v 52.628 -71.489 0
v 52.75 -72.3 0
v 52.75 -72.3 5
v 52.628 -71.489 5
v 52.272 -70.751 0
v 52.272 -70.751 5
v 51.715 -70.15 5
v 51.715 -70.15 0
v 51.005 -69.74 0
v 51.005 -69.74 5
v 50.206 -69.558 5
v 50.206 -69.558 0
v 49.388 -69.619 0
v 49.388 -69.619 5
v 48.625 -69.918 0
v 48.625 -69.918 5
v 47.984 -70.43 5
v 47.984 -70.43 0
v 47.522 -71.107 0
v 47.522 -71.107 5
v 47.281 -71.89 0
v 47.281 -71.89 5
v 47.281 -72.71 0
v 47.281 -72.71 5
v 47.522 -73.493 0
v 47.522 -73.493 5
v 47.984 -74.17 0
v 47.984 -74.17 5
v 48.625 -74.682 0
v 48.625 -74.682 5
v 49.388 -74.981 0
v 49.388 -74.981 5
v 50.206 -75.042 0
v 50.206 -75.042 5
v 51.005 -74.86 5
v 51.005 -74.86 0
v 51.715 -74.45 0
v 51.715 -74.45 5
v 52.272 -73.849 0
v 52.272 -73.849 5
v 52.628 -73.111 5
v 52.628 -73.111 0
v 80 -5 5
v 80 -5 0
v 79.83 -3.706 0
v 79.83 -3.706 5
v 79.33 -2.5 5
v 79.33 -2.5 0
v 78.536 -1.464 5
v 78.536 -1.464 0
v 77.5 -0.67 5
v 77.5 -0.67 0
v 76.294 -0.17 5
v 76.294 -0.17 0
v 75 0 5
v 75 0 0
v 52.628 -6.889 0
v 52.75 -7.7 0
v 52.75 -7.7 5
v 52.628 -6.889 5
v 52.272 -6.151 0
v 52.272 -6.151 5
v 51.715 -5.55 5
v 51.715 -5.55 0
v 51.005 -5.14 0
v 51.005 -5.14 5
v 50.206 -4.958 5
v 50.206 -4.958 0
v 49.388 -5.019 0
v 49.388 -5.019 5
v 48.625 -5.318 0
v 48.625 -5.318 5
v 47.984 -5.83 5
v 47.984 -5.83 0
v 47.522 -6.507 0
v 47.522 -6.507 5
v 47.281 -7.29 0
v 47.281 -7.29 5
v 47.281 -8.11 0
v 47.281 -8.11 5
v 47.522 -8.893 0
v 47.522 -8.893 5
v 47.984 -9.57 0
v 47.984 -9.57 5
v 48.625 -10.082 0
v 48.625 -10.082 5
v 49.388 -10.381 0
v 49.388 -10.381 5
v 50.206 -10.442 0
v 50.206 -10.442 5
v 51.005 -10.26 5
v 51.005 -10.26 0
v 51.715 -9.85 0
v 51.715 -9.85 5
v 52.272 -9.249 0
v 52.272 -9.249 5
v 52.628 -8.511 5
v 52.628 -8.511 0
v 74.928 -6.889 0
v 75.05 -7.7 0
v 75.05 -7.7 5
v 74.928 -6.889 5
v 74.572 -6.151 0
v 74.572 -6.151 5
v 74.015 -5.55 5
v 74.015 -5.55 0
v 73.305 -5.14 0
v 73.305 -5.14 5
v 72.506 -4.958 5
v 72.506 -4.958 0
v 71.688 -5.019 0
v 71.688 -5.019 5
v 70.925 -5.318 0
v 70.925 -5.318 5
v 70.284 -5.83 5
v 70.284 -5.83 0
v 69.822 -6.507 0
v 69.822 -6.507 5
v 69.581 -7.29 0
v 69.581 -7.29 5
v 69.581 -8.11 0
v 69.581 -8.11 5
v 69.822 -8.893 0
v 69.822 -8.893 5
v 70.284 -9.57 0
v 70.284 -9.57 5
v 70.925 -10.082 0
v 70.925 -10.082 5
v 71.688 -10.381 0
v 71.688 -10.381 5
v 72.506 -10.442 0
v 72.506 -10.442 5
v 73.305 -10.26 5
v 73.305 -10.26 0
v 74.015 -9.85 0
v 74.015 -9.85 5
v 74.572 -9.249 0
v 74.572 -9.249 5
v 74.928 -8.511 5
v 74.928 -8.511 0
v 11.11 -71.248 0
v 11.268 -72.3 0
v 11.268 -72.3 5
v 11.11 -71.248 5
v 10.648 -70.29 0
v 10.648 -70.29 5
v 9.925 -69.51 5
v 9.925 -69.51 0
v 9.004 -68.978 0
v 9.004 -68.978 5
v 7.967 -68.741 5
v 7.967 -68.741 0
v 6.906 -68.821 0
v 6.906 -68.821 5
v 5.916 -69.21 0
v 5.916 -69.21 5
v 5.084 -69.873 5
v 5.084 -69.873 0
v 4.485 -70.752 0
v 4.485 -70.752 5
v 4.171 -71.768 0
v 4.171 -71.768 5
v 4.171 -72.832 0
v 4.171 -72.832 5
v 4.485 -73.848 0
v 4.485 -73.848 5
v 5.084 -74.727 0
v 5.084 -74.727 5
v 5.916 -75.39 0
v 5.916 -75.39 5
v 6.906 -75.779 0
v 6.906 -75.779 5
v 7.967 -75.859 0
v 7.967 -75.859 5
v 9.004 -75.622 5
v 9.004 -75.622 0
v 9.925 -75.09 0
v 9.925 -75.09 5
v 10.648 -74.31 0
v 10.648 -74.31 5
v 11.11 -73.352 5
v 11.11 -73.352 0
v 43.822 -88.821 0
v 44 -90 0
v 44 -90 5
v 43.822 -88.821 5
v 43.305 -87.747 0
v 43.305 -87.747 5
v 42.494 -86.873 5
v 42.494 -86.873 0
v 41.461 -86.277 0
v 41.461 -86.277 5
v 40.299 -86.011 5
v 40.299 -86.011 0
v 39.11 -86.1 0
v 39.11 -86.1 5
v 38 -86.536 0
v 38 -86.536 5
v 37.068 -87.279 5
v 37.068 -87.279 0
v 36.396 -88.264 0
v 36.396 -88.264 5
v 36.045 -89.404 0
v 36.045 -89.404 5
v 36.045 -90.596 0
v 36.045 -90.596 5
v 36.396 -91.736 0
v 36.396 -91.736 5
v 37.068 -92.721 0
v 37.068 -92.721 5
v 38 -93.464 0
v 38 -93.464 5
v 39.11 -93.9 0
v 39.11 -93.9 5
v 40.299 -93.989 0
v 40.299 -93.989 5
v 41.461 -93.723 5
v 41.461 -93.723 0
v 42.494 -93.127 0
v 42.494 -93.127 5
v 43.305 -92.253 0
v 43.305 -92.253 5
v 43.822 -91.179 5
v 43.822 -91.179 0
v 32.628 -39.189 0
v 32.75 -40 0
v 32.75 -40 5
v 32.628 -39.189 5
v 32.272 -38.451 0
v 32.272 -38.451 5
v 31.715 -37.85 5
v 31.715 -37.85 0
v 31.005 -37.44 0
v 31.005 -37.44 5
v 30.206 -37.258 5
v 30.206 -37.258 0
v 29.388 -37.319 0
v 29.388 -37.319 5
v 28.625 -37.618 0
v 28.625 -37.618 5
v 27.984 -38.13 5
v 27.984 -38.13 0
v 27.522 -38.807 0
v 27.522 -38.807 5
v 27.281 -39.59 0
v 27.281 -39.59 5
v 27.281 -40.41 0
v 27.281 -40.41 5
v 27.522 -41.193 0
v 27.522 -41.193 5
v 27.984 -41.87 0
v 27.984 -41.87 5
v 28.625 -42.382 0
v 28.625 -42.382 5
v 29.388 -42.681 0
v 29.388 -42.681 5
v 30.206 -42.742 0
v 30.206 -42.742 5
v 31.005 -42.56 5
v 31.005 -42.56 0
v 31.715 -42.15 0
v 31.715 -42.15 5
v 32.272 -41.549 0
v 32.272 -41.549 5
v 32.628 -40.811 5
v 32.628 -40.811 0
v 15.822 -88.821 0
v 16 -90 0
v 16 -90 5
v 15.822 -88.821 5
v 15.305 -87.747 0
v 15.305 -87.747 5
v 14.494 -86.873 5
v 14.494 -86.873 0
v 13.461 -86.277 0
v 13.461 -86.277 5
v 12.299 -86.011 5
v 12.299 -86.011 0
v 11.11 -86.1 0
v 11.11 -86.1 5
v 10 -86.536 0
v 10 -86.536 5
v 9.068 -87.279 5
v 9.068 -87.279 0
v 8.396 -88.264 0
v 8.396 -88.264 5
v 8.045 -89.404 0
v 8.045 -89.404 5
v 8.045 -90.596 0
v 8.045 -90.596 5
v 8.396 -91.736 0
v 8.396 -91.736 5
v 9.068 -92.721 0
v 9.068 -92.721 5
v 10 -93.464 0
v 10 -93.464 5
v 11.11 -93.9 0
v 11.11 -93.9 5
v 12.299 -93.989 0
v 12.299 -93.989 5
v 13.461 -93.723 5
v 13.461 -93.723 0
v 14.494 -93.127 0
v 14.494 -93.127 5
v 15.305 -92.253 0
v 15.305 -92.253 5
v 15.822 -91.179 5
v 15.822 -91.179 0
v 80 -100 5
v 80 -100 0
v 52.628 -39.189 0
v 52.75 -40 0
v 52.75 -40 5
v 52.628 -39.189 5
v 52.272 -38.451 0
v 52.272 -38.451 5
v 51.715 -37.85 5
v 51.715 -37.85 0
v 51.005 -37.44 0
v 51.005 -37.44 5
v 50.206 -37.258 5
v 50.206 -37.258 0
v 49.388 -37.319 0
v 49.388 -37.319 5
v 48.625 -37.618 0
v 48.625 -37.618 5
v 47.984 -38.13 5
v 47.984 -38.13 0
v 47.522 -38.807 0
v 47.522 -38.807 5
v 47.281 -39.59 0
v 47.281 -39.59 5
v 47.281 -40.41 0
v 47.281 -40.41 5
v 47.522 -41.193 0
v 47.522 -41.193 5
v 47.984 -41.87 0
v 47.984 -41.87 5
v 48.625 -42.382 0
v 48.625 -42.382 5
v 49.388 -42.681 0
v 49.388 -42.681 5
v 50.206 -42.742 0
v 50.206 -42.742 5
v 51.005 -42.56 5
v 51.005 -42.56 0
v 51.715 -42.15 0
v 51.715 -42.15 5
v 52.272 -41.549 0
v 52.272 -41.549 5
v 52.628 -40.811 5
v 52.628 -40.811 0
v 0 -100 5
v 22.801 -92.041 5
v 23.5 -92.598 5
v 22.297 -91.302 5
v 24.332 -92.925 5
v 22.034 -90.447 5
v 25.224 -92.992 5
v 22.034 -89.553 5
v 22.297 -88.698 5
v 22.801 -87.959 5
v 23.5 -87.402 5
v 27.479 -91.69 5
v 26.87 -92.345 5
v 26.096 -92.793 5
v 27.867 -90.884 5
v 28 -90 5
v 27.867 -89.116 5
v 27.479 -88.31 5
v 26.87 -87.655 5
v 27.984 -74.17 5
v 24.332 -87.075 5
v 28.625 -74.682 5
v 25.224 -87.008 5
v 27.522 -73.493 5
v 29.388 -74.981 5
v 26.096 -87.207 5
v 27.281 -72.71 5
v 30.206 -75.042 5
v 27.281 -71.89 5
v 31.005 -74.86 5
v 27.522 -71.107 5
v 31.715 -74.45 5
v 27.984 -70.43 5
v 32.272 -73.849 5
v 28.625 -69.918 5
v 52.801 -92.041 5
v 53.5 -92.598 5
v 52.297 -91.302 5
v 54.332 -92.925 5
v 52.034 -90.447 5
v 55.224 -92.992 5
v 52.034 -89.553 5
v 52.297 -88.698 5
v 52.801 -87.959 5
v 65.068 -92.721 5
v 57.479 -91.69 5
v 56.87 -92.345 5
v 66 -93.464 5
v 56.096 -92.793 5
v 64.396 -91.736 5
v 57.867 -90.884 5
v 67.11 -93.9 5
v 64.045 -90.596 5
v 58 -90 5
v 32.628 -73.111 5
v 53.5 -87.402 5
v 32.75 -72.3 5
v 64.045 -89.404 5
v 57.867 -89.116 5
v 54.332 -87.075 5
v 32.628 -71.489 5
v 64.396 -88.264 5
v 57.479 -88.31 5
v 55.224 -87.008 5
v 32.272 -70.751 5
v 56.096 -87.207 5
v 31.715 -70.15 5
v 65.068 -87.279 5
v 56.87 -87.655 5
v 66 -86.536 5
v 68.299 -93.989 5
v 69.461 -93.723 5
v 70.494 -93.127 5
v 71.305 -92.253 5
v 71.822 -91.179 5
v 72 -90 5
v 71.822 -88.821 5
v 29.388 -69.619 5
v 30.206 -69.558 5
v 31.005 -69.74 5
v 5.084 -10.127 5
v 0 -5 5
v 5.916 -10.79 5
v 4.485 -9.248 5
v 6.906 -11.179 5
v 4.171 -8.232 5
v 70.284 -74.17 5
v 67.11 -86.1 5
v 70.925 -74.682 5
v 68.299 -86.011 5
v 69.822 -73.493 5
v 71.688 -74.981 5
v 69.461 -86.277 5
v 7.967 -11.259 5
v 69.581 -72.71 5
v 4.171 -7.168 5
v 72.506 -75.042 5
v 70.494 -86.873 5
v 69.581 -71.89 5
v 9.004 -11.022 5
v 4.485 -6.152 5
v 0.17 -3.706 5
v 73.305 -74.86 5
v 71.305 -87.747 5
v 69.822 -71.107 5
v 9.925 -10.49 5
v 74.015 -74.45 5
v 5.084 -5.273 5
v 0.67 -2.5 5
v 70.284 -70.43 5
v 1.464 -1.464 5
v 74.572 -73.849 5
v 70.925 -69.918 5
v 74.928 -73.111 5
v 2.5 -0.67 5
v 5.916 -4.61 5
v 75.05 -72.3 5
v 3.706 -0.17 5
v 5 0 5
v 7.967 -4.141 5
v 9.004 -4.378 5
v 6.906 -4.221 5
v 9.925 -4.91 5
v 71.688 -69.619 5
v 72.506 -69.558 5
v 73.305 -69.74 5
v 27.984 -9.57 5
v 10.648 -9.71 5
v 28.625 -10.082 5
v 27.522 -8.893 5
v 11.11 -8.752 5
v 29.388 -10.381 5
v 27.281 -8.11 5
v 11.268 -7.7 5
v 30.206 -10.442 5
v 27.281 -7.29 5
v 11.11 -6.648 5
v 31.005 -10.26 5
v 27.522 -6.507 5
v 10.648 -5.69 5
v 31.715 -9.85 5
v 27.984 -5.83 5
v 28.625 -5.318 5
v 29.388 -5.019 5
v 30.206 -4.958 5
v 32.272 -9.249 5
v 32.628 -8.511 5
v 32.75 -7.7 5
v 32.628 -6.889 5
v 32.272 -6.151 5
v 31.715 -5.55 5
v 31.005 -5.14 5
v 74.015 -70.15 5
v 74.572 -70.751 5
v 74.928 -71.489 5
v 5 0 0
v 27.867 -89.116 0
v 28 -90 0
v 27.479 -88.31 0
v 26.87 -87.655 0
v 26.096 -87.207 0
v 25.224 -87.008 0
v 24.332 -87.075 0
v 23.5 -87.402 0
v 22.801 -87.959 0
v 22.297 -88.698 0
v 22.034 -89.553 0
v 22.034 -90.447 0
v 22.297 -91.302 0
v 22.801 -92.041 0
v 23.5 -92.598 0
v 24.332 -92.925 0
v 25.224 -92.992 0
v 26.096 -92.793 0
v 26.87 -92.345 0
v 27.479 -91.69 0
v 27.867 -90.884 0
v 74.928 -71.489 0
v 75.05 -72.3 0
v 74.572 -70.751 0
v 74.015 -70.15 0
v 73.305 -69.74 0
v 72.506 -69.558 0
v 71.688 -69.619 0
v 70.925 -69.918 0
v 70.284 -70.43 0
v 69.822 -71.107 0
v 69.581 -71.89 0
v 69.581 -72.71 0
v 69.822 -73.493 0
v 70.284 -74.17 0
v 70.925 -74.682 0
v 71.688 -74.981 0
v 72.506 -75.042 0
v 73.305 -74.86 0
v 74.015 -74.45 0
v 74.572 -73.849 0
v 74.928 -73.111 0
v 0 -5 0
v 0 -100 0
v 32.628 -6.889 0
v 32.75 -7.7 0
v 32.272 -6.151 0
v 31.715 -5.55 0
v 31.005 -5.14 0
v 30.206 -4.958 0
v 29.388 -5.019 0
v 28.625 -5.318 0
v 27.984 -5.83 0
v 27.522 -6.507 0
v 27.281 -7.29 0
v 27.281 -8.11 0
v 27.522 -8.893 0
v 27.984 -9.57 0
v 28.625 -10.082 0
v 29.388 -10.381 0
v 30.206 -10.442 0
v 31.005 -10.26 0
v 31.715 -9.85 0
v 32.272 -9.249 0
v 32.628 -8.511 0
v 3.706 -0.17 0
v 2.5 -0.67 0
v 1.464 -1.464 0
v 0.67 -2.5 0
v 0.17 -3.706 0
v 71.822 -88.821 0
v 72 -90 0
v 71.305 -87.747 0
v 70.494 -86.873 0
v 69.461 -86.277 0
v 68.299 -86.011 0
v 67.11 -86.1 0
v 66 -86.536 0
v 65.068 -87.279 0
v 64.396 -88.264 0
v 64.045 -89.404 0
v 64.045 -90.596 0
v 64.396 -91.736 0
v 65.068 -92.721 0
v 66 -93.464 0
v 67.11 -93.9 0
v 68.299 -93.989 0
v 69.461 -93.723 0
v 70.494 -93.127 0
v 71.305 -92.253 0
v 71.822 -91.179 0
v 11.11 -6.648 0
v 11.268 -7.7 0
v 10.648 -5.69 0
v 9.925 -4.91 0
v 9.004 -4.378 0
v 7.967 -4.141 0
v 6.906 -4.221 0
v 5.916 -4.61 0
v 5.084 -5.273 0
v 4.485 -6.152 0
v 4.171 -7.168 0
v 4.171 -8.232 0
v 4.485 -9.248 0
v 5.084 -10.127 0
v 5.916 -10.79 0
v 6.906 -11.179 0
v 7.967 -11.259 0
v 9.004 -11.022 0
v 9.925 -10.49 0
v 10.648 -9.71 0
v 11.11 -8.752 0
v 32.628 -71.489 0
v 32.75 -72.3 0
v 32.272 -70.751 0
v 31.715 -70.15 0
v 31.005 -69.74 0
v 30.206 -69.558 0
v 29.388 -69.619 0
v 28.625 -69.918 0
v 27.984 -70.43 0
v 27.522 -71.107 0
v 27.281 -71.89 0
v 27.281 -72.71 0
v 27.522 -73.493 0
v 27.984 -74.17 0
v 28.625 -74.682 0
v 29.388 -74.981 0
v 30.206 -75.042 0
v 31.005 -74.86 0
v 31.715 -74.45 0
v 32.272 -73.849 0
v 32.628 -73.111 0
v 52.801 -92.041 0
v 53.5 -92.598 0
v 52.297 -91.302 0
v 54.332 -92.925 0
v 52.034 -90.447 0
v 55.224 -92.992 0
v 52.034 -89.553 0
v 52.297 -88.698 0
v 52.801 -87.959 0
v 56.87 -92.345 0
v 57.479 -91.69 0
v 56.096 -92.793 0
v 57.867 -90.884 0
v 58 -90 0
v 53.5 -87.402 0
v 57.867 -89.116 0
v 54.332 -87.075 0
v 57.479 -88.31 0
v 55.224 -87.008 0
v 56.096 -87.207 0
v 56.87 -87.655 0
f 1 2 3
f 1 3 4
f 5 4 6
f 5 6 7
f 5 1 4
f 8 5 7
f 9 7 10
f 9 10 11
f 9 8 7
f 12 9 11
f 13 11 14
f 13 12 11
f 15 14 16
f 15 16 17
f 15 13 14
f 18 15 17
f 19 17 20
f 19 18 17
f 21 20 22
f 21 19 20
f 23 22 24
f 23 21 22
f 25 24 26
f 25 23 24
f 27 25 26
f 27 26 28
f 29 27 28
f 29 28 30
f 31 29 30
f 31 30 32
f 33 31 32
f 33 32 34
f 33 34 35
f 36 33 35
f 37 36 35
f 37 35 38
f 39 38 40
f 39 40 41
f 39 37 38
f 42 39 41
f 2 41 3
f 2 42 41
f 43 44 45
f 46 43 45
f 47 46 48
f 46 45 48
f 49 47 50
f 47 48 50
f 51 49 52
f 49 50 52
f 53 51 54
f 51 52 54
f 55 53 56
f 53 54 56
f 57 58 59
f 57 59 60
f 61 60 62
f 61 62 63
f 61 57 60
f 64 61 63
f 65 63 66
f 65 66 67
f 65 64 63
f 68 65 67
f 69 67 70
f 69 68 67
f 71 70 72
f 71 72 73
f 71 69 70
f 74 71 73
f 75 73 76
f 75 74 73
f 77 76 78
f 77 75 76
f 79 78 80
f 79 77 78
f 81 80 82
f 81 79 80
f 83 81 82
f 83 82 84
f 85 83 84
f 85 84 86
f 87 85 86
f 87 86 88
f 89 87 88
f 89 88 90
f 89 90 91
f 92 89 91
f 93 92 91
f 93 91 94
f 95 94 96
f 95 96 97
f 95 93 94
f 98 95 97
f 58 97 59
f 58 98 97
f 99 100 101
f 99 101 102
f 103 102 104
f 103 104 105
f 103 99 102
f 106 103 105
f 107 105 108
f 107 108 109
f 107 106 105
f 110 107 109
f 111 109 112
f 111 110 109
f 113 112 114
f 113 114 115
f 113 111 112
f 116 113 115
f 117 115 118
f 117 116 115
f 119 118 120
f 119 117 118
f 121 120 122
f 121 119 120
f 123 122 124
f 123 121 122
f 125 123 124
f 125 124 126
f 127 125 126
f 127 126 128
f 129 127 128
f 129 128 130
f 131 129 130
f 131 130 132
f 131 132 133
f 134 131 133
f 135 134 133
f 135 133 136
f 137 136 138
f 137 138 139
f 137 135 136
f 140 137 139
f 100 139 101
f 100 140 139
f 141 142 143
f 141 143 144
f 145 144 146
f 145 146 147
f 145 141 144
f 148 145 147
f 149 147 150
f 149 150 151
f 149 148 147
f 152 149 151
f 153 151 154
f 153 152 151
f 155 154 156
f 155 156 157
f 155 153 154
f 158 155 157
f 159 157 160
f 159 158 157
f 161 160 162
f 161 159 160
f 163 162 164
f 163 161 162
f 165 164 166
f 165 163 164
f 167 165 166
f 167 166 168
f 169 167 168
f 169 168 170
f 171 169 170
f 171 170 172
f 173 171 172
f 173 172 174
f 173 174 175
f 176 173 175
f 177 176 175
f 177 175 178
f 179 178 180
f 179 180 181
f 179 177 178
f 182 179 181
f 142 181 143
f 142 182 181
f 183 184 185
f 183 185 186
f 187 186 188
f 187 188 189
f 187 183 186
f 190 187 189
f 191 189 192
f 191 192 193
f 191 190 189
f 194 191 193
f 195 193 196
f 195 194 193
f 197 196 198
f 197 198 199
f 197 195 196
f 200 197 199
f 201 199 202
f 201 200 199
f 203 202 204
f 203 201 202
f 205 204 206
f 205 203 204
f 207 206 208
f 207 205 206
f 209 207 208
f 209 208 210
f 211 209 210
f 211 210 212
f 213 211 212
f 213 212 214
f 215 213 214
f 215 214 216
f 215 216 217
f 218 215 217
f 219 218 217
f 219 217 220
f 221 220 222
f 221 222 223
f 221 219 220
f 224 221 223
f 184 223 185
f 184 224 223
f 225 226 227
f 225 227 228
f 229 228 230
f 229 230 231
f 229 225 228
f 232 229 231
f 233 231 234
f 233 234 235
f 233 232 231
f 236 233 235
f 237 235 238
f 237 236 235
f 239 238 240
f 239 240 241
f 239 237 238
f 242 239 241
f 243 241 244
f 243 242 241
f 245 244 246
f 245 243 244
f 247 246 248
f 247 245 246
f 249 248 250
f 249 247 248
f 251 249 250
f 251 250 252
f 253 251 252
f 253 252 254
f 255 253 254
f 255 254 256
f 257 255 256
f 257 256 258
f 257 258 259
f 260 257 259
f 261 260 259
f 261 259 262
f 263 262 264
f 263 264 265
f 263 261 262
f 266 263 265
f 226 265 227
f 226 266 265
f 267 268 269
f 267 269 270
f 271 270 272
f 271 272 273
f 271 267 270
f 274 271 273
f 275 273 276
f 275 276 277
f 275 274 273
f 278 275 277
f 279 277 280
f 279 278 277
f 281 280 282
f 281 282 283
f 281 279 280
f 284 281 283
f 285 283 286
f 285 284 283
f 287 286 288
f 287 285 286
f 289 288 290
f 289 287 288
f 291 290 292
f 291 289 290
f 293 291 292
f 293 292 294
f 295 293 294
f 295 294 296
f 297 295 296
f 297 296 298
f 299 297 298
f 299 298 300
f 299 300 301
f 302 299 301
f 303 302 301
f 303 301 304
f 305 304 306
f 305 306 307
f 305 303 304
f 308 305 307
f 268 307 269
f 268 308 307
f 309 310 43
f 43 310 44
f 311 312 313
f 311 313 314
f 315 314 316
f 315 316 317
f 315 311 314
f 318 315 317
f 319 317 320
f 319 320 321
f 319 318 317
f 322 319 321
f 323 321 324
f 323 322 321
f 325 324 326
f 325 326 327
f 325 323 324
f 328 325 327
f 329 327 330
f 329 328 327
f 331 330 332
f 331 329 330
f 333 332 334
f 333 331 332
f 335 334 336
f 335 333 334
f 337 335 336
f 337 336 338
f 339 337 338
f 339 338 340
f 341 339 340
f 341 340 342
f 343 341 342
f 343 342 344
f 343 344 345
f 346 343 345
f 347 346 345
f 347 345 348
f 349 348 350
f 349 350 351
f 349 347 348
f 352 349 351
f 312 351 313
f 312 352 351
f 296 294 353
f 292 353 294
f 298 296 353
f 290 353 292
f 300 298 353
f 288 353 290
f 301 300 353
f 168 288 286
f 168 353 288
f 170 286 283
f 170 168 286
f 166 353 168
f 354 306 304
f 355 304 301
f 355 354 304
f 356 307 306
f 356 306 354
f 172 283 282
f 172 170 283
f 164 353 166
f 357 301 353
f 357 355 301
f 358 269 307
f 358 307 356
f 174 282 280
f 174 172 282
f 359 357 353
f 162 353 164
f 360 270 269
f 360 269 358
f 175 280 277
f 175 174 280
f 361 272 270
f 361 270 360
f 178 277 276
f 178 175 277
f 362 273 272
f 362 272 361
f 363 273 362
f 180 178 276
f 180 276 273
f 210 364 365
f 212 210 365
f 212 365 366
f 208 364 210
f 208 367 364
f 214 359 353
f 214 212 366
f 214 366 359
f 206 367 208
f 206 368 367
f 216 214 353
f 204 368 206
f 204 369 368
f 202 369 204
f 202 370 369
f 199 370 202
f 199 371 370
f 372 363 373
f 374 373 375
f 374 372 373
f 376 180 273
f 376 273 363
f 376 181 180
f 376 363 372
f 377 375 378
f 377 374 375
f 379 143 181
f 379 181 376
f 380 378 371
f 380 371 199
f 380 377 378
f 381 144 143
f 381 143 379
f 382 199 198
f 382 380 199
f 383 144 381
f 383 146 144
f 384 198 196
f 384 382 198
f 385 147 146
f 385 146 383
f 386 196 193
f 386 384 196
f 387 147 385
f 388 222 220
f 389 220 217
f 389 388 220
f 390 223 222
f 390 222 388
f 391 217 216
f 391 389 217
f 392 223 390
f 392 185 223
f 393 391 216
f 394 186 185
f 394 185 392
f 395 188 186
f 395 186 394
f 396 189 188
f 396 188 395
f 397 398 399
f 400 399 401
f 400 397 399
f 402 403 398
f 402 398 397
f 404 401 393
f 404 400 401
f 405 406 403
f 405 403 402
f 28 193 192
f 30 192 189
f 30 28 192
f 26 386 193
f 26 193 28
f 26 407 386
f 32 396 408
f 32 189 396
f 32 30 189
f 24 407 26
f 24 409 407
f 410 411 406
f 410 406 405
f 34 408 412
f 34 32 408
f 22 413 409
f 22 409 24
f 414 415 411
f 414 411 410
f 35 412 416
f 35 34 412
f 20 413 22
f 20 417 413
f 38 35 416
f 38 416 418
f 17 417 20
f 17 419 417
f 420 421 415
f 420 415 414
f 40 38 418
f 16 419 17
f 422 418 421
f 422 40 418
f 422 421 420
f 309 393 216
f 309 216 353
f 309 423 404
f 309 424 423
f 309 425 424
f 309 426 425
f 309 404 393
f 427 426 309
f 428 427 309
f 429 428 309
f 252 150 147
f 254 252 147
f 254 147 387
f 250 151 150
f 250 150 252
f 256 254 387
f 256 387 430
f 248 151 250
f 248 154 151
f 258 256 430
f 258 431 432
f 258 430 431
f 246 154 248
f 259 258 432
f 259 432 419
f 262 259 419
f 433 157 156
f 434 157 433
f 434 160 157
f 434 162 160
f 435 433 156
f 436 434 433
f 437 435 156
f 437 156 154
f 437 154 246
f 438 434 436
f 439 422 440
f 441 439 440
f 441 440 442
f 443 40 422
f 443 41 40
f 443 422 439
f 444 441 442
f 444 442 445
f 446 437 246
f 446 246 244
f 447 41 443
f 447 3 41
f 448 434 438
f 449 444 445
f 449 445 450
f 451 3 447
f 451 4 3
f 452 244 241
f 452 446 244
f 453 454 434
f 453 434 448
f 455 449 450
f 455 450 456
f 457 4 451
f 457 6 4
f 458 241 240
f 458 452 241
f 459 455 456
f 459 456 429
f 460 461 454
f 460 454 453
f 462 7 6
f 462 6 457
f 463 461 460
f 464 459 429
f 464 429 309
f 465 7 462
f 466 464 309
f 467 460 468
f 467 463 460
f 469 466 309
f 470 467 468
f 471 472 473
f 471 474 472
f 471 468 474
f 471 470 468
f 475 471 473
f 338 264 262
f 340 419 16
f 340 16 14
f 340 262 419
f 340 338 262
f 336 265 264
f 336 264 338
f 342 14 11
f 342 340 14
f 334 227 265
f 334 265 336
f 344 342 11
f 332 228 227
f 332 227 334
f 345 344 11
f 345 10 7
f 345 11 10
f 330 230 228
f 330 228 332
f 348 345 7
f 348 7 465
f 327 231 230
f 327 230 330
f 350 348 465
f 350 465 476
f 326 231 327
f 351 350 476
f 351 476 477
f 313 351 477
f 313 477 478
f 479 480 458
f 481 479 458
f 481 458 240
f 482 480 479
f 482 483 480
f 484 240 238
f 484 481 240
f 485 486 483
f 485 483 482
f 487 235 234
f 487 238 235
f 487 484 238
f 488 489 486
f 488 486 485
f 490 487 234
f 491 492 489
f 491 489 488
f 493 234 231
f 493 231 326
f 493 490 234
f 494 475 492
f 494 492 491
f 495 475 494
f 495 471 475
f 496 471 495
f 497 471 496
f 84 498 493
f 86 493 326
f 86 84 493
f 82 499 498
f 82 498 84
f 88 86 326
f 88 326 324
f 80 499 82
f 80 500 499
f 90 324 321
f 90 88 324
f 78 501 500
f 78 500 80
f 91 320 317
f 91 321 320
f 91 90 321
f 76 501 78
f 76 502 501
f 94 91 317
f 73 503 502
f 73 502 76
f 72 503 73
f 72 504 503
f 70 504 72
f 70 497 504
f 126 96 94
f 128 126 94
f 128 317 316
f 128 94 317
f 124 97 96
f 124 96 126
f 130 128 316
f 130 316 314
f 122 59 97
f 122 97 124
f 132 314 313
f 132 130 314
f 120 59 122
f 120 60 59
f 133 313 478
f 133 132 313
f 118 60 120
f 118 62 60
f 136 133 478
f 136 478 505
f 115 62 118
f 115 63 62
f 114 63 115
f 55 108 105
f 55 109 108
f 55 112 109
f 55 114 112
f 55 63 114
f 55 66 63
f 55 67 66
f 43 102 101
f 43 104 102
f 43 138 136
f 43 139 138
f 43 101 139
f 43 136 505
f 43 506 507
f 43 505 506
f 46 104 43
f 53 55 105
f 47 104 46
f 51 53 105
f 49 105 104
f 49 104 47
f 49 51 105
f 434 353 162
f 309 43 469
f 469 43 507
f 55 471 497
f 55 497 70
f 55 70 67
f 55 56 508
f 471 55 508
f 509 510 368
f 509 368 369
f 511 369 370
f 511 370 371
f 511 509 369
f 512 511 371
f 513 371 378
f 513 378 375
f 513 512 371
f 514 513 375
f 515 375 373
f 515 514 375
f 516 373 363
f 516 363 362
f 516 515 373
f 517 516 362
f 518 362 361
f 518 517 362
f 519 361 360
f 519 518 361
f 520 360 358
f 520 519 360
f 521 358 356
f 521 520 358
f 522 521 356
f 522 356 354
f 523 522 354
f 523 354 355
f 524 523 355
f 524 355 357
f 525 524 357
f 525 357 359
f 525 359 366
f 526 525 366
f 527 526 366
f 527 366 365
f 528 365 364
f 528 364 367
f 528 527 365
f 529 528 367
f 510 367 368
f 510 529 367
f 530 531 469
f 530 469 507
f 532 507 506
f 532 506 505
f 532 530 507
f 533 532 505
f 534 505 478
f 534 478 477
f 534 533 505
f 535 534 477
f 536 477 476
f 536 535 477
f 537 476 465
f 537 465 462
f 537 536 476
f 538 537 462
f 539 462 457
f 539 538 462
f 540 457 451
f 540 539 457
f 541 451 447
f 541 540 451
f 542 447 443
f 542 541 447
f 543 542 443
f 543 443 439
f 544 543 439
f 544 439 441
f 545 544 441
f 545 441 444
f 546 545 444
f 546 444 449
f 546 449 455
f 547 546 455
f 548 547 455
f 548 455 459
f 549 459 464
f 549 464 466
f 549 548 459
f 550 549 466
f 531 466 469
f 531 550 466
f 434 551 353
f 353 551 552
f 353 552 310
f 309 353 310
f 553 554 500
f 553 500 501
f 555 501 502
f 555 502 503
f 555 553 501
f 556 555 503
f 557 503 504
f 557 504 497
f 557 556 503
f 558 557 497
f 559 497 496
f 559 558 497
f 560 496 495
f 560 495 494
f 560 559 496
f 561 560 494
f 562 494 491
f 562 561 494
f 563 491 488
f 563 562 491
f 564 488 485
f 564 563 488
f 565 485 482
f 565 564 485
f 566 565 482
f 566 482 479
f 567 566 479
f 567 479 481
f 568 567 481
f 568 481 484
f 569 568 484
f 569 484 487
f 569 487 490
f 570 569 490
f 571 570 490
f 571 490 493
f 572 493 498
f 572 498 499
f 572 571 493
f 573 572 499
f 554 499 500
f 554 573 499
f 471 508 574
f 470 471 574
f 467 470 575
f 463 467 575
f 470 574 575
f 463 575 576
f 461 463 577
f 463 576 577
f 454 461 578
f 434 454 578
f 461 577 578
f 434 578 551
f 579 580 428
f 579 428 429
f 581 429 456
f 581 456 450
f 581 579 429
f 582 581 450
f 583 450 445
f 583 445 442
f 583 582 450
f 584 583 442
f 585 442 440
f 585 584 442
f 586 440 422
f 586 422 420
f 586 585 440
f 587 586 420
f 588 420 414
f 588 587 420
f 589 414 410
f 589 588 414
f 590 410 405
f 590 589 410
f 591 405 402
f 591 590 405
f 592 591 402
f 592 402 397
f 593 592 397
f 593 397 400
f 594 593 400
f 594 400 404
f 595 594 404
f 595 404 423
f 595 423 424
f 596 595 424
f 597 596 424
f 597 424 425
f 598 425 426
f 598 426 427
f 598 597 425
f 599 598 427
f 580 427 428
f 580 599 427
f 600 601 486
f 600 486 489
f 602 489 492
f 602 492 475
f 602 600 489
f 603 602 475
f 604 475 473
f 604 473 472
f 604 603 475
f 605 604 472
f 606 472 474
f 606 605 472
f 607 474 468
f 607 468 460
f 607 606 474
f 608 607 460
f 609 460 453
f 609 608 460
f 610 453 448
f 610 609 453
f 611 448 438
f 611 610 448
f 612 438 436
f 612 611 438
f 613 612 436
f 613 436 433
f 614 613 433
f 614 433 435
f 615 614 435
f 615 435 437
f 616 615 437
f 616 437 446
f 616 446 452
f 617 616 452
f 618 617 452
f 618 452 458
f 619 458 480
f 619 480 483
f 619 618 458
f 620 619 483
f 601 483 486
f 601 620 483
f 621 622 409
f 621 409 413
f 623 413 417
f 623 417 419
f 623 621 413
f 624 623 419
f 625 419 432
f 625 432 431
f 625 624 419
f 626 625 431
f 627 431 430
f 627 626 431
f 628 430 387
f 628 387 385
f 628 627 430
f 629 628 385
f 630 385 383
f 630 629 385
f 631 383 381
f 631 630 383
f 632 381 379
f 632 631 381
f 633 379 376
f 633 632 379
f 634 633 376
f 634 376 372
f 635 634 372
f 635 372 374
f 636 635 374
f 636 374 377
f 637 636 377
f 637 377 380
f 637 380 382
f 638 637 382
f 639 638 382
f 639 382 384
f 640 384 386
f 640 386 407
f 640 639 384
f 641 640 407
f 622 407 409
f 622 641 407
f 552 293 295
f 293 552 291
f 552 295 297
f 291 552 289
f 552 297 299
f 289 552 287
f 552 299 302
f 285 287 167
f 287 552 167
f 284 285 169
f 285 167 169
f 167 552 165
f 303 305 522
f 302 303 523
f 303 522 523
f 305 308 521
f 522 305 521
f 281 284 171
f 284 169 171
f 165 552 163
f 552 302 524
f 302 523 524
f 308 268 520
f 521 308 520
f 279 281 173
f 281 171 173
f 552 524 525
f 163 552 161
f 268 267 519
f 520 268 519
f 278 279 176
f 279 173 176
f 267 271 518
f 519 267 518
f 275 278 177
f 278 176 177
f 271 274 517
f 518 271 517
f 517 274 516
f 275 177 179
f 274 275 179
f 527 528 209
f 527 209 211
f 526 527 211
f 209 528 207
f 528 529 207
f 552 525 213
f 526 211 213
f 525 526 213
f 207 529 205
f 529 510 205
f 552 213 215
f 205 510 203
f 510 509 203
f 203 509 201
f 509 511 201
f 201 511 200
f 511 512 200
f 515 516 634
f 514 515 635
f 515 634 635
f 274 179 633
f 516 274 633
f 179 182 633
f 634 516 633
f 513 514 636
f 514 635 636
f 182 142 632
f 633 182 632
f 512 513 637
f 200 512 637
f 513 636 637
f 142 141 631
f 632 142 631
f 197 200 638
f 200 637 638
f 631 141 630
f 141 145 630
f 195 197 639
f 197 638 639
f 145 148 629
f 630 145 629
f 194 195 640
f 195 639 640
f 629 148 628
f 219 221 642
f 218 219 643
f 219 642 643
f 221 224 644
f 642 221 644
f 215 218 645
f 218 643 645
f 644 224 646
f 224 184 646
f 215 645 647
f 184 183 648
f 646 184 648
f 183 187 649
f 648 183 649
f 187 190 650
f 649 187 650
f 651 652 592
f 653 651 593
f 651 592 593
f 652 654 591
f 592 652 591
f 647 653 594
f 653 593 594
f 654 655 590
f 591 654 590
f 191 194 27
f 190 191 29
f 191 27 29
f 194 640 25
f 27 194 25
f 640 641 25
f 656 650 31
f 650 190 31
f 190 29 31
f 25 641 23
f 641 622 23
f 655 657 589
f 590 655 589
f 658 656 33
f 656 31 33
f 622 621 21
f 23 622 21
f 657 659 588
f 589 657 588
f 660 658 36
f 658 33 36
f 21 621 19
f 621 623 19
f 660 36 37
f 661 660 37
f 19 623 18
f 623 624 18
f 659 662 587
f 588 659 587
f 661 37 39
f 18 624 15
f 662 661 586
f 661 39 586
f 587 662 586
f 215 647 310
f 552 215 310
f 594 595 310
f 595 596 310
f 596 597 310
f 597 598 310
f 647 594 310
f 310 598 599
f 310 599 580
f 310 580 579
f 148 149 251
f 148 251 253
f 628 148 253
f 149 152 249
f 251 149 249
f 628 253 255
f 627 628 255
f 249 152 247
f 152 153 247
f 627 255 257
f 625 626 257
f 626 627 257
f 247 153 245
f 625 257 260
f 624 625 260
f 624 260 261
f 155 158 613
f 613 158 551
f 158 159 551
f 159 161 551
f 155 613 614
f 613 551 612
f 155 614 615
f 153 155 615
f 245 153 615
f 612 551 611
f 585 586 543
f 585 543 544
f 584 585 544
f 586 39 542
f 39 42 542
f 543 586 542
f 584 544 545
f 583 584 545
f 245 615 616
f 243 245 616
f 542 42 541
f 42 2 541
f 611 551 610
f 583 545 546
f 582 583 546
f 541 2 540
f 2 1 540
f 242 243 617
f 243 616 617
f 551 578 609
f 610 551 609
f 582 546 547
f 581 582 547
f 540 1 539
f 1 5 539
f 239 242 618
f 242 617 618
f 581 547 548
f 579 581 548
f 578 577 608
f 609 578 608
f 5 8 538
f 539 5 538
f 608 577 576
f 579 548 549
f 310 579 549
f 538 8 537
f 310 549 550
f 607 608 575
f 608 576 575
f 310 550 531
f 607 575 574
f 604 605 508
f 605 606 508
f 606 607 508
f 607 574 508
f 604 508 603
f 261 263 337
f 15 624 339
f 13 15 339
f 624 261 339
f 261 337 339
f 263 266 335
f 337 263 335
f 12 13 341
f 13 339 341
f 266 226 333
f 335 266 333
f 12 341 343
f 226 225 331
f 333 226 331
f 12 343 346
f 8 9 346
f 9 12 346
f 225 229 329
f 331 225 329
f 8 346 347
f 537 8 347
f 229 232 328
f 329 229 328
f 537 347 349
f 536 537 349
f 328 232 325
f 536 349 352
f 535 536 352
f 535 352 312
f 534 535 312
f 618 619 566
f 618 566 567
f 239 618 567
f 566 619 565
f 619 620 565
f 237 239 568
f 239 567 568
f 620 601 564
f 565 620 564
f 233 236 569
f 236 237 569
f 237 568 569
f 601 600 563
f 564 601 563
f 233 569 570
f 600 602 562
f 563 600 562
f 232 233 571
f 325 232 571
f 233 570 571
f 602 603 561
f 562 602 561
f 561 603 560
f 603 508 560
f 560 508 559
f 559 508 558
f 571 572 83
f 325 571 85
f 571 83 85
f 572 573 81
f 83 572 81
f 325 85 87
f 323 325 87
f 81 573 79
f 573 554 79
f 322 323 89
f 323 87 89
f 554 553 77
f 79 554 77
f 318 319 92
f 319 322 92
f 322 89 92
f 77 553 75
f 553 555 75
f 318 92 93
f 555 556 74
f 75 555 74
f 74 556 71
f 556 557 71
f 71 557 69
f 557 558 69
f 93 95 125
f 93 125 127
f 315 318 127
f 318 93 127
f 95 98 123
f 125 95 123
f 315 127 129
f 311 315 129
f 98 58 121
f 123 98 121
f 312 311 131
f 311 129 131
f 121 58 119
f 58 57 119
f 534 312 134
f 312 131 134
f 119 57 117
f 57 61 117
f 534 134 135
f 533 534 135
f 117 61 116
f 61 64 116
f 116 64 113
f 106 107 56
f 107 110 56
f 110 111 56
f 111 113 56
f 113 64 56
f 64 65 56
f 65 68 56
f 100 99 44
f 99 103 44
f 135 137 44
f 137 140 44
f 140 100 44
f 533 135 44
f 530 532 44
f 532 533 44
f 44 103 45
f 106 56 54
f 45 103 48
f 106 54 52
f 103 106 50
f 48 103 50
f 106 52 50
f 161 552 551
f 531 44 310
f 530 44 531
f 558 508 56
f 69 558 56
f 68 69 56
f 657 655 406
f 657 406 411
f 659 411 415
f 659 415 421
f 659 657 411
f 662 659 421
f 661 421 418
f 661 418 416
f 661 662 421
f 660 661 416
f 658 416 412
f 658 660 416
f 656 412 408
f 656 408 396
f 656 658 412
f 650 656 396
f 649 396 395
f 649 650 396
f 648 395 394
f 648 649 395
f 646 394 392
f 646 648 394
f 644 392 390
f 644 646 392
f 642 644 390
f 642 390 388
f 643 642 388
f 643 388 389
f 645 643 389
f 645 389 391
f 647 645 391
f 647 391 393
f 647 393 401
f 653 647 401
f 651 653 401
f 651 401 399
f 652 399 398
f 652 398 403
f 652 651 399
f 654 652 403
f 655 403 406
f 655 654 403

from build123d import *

# Parameters (mm, degrees)
F0_R     = 4
F0_R_2   = 3
F0_R_3   = 3.5685
F0_R_4   = 2.75
F1_DEPTH = 5


with BuildPart() as f1:
    # F0 (on Top) → F1 (new body)
    with BuildSketch(Plane.XY):
        with BuildLine():
            Line((40, 0), (5, 0))
            ThreePointArc((5, 0), (1.464466, -1.464466), (0, -5))
            Line((0, -5), (0, -100))
            Line((0, -100), (80, -100))
            Line((80, -100), (80, -5))
            ThreePointArc((80, -5), (78.535534, -1.464466), (75, 0))
            Line((75, 0), (40, 0))
        make_face()
        with Locations((12, -90)):
            Circle(F0_R, mode=Mode.SUBTRACT)
        with Locations((25, -90)):
            Circle(F0_R_2, mode=Mode.SUBTRACT)
        with Locations((7.7, -72.3)):
            Circle(F0_R_3, mode=Mode.SUBTRACT)
        with Locations((30, -72.3)):
            Circle(F0_R_4, mode=Mode.SUBTRACT)
        with Locations((40, -90)):
            Circle(F0_R, mode=Mode.SUBTRACT)
        with Locations((55, -90)):
            Circle(F0_R_2, mode=Mode.SUBTRACT)
        with Locations((68, -90)):
            Circle(F0_R, mode=Mode.SUBTRACT)
        with Locations((50, -72.3)):
            Circle(F0_R_4, mode=Mode.SUBTRACT)
        with Locations((72.3, -72.3)):
            Circle(F0_R_4, mode=Mode.SUBTRACT)
        with Locations((30, -40)):
            Circle(F0_R_4, mode=Mode.SUBTRACT)
        with Locations((7.7, -7.7)):
            Circle(F0_R_3, mode=Mode.SUBTRACT)
        with Locations((30, -7.7)):
            Circle(F0_R_4, mode=Mode.SUBTRACT)
        with Locations((50, -40)):
            Circle(F0_R_4, mode=Mode.SUBTRACT)
        with Locations((50, -7.7)):
            Circle(F0_R_4, mode=Mode.SUBTRACT)
        with Locations((72.3, -7.7)):
            Circle(F0_R_4, mode=Mode.SUBTRACT)
    extrude(amount=F1_DEPTH)


solid = f1.part
